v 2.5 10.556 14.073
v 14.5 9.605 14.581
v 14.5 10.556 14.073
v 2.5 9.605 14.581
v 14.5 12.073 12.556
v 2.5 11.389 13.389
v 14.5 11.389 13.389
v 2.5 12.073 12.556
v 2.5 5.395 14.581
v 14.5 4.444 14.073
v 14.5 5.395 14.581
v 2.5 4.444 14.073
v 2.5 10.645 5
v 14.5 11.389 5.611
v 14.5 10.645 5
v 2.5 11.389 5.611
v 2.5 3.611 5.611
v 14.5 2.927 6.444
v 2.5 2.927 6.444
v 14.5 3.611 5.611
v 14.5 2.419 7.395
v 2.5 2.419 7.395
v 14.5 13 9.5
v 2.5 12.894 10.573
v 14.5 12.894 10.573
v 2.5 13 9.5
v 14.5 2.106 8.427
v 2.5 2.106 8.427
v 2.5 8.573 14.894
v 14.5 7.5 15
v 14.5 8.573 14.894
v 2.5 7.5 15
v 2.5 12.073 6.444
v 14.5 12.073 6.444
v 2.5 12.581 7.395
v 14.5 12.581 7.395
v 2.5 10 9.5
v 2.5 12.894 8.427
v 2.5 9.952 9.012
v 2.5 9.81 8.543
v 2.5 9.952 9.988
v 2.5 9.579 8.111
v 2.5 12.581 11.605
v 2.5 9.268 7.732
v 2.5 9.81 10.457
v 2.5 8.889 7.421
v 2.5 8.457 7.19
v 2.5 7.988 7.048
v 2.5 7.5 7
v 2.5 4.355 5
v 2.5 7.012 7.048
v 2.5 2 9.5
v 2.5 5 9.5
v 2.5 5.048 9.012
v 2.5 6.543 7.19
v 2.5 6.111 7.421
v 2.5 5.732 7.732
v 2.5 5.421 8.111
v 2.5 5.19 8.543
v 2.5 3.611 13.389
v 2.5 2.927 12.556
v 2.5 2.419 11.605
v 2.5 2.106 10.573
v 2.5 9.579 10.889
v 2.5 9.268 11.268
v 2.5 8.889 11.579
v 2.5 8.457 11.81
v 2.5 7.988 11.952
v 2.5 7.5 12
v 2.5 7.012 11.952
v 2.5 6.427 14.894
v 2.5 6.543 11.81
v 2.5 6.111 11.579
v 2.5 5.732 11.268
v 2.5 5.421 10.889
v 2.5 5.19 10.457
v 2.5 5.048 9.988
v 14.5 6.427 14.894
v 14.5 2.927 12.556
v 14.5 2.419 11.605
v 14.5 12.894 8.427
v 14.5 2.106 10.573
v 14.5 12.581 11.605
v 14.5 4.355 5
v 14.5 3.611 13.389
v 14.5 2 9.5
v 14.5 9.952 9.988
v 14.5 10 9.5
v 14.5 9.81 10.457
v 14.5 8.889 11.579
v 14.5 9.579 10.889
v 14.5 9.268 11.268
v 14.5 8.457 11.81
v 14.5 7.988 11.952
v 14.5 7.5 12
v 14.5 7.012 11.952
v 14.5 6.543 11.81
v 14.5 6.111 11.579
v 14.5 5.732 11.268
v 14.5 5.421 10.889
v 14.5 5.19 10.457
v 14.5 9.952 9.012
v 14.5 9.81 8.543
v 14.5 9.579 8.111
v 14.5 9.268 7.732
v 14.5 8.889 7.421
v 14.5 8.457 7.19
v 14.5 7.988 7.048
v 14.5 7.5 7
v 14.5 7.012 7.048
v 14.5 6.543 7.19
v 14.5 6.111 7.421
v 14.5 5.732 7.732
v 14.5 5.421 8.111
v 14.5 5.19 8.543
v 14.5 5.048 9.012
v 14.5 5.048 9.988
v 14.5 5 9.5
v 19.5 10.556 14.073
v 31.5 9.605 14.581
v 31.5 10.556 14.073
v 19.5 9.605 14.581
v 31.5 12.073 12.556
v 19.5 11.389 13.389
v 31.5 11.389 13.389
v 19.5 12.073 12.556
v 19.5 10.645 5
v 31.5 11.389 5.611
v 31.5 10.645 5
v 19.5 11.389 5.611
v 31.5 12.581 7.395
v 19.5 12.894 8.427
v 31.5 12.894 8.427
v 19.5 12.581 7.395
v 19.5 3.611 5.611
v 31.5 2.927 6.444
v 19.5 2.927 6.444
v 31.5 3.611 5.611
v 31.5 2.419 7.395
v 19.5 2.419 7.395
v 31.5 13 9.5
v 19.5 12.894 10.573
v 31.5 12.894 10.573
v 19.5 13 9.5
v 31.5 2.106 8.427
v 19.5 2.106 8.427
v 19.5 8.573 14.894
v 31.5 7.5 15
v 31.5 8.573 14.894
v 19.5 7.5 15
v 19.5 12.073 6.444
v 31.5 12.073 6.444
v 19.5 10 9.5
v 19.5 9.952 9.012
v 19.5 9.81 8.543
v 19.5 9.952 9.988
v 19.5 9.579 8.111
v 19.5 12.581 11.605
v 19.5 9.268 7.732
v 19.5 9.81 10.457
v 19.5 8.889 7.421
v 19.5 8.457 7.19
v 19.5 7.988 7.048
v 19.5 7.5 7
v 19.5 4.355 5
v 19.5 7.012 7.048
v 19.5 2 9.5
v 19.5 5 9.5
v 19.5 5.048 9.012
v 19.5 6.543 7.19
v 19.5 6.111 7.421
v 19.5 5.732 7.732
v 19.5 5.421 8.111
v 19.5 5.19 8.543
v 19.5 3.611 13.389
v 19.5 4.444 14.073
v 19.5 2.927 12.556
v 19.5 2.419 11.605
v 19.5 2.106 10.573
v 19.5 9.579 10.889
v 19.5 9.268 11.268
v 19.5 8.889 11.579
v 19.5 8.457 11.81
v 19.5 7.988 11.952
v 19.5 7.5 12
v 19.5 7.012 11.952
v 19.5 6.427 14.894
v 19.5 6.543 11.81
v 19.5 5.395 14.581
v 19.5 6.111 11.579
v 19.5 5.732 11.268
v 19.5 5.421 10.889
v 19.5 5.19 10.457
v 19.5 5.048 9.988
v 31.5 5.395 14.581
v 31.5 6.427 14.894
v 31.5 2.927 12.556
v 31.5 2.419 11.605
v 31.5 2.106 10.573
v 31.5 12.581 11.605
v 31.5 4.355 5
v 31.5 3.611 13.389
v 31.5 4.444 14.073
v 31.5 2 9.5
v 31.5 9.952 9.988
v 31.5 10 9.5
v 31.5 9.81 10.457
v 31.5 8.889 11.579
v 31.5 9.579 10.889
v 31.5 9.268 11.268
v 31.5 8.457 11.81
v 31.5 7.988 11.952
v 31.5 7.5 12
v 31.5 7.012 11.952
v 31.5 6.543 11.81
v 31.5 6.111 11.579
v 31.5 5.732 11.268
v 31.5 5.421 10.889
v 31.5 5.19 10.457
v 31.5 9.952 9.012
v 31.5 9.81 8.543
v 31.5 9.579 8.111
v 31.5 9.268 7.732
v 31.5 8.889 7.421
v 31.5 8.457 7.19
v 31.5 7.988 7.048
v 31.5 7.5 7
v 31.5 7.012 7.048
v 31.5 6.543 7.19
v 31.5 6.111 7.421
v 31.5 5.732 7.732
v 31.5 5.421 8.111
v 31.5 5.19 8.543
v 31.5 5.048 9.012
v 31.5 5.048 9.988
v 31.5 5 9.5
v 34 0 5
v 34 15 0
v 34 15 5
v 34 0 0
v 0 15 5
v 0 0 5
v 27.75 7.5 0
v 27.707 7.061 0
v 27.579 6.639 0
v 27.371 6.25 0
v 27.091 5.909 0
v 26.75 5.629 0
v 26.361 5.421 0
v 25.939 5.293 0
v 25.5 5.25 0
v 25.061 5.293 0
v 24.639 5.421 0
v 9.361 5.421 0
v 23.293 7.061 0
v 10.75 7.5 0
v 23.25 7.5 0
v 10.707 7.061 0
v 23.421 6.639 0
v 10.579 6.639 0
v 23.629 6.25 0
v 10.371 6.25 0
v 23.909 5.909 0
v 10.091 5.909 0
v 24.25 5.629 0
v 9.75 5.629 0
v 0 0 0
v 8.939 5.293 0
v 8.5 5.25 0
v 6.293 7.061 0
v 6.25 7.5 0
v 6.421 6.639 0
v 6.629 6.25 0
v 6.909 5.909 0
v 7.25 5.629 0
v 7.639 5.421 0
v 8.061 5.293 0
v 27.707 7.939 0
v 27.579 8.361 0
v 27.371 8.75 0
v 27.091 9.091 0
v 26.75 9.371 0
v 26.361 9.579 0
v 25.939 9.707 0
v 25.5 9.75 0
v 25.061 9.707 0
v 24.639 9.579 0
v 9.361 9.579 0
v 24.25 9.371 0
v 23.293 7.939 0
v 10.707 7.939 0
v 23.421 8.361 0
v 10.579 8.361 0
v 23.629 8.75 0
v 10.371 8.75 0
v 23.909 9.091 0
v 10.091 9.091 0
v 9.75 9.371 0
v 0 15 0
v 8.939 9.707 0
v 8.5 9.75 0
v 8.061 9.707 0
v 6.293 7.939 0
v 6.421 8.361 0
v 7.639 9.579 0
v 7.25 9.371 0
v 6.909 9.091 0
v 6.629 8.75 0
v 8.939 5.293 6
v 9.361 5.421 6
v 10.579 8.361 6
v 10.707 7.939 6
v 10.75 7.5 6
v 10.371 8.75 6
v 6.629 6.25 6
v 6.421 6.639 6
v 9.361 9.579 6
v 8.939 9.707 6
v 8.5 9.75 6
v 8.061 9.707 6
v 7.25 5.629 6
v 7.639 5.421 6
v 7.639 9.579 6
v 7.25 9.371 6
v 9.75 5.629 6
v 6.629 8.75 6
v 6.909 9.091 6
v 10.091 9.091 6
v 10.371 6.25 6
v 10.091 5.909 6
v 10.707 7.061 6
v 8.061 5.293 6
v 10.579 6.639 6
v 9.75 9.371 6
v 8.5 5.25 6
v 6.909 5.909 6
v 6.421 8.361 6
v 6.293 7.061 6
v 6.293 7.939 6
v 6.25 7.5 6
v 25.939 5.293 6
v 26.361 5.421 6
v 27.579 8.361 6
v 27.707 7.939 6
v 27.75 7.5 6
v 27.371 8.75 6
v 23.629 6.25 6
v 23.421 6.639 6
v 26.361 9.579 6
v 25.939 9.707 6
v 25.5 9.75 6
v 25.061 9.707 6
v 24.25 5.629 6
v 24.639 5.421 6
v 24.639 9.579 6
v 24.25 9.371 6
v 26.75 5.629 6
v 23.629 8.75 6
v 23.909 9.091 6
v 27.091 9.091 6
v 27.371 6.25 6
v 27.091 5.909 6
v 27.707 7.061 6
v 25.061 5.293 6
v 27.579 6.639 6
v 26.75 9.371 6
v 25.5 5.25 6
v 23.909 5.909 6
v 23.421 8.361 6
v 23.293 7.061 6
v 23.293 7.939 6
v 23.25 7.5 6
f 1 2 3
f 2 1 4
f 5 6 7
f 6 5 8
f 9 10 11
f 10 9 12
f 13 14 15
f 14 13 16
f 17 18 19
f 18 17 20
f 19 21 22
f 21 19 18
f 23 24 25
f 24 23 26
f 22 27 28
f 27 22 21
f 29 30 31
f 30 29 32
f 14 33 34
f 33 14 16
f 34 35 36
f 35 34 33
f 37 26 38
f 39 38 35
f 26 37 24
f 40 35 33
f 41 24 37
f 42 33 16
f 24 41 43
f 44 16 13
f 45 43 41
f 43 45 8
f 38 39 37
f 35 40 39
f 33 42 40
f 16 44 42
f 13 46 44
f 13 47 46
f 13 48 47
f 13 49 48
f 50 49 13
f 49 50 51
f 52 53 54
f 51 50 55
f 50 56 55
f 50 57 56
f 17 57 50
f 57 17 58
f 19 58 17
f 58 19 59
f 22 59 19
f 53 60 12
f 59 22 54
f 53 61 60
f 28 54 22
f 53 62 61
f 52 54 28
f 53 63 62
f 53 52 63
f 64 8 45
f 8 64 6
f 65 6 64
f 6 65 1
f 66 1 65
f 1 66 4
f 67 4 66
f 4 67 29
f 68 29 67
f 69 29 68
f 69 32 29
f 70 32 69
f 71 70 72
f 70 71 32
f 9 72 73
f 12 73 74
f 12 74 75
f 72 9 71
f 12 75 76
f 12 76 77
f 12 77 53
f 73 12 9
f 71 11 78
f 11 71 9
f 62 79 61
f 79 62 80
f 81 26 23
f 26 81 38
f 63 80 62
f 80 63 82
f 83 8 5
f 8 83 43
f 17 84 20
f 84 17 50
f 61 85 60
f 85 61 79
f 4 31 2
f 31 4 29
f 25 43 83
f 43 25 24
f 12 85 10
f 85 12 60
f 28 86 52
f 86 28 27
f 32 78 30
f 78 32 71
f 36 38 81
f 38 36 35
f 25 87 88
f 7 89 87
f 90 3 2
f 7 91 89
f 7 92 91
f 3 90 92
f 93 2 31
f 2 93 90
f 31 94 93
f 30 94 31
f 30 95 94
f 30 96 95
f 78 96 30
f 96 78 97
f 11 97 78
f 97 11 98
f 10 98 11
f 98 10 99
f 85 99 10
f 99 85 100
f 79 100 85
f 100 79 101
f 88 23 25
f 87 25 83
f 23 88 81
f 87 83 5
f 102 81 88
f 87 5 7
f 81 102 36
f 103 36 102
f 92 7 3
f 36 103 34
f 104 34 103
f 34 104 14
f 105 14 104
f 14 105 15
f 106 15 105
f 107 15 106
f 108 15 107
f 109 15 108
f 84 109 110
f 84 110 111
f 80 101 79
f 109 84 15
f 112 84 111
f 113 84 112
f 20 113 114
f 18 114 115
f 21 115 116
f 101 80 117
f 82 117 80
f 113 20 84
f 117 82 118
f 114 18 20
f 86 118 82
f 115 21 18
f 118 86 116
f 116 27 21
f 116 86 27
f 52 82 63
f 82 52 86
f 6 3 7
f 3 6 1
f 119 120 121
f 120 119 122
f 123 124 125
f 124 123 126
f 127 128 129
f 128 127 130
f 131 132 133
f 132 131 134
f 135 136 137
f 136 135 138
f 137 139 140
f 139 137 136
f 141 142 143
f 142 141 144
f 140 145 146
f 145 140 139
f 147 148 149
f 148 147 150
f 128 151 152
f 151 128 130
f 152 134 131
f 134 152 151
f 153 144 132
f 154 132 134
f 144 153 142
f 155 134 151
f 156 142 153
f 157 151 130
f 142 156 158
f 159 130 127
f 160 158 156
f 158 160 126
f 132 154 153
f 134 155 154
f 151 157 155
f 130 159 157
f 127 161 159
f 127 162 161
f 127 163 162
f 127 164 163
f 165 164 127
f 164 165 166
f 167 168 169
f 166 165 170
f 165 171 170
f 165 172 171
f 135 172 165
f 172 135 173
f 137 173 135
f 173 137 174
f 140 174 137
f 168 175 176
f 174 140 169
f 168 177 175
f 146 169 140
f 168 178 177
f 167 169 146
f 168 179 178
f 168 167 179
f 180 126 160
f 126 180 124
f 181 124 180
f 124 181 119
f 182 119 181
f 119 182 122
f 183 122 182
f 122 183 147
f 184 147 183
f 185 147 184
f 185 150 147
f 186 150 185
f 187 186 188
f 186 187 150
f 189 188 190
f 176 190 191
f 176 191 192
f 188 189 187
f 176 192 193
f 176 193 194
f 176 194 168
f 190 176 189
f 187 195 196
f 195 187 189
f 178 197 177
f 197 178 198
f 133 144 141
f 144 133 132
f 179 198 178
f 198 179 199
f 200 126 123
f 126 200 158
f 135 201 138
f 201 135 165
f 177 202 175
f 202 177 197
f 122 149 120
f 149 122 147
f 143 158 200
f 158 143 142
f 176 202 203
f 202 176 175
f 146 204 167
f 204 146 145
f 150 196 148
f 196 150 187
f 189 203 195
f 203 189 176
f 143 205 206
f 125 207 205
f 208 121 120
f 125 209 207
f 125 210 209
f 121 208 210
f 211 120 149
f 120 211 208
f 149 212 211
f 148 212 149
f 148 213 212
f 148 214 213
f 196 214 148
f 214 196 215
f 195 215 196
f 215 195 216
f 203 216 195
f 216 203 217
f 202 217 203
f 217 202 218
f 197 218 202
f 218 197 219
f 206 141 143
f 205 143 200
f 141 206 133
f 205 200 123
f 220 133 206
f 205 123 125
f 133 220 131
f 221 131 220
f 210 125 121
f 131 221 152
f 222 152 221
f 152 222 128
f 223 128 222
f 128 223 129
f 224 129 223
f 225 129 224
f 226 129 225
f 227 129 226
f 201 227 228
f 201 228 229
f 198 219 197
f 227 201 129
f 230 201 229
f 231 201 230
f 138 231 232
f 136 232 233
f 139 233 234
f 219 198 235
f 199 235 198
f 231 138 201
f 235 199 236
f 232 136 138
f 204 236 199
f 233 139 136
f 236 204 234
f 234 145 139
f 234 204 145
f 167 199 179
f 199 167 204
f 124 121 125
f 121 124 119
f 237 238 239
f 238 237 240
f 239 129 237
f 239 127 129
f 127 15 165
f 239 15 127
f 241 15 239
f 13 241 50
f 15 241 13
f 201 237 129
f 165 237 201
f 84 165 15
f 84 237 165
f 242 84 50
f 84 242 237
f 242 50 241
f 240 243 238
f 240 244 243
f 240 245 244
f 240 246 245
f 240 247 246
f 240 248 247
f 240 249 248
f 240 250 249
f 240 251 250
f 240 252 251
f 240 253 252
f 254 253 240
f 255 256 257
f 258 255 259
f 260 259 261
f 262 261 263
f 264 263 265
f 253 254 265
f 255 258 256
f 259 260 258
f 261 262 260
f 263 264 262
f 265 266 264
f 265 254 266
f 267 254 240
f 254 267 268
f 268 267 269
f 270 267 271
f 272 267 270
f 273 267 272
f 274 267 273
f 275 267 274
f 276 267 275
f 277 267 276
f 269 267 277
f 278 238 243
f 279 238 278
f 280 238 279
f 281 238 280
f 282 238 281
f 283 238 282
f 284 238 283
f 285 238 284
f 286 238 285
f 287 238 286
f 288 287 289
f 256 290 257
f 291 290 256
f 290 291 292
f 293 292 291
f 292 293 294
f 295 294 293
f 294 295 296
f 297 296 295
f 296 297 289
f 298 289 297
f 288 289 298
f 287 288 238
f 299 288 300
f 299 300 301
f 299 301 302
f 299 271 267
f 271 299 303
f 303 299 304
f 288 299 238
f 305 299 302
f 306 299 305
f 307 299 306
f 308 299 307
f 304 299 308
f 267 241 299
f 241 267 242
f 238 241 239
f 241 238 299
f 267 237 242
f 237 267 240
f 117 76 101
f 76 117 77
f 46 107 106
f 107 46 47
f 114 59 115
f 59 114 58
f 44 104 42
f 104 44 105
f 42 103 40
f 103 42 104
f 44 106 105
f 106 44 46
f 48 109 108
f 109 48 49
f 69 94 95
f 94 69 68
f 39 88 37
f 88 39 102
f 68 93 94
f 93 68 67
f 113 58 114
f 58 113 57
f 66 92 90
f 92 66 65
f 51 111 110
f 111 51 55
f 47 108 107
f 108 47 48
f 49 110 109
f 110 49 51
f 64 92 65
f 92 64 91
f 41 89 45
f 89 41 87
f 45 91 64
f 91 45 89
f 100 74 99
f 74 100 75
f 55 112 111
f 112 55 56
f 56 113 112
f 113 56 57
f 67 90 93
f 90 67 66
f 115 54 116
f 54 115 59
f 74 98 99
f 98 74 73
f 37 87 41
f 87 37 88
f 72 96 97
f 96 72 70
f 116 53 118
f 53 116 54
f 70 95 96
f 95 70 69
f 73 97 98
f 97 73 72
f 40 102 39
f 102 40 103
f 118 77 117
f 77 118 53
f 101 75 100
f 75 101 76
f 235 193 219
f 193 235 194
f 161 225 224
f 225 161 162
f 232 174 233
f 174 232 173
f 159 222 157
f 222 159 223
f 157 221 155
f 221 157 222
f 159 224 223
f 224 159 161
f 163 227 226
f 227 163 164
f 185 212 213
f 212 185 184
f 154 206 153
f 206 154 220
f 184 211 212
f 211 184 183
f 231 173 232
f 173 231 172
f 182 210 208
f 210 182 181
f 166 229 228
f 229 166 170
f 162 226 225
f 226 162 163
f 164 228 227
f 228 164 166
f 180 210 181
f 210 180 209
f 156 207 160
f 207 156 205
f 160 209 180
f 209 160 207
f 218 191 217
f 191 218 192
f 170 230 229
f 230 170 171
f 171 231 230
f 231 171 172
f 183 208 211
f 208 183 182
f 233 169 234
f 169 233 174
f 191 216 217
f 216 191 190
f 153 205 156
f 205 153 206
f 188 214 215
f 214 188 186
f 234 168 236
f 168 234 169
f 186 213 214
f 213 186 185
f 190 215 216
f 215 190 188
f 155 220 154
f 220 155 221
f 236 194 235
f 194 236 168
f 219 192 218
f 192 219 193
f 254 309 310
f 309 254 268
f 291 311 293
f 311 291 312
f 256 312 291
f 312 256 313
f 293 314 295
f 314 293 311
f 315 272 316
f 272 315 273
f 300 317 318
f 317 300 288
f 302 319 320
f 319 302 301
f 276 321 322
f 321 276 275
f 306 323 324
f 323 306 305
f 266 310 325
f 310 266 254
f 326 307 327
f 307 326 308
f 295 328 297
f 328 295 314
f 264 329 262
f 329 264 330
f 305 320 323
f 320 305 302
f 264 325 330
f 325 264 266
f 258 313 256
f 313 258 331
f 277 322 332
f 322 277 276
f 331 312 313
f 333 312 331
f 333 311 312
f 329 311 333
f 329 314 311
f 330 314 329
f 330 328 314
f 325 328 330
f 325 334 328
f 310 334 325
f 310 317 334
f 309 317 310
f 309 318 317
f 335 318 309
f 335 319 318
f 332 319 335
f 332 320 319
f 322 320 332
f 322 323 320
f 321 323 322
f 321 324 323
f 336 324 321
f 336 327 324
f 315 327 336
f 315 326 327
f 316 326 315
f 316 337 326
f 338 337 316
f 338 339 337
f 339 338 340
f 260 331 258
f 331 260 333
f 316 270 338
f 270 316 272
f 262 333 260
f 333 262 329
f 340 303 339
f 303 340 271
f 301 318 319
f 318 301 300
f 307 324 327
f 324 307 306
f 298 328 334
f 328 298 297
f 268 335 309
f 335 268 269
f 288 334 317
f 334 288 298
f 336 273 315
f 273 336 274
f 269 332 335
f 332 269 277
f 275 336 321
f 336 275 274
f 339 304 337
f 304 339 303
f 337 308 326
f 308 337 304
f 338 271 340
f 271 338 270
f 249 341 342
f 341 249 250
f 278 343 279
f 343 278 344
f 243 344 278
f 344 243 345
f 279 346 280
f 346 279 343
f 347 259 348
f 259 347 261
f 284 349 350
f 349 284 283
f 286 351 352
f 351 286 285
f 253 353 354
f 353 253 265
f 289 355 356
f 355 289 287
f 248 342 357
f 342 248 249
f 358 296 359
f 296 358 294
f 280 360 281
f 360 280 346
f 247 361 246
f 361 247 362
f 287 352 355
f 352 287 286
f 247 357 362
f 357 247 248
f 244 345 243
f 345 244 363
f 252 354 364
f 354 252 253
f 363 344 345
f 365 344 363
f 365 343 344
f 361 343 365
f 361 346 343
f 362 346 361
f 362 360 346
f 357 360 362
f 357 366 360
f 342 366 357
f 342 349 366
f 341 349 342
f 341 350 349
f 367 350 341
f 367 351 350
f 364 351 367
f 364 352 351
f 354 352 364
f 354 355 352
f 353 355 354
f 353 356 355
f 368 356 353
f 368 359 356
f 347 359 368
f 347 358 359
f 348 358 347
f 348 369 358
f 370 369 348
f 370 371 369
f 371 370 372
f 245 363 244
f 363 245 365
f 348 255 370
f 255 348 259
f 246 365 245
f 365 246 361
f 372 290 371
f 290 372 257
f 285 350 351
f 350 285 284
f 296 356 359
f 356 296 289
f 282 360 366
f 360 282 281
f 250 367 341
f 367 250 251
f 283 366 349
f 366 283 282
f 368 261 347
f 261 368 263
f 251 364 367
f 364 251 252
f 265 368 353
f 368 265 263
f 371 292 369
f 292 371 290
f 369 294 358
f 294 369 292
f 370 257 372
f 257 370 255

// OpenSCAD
$fn = 32;

// ----------------------------------------------------------------------
// Cable clip: cable 5 mm, clamp 11 mm, base 34 mm
// ----------------------------------------------------------------------

// --- parameters (mm) ---
foot_w = 34;              // base length, X
foot_d = 15;              // base width, Y
foot_t = 5;               // base thickness
hose_seat_d = 11;         // clamp outside diameter
ring_t = 3;               // clamp wall
cable_d = 5;              // cable opening
ring_w = 12;              // clamp width along the cable
screw_d = 4.5;            // screw clearance
sink = 1;                 // overlap of the clamp into the base
pitch = 17;               // distance between the two clamps

module base() {
  cube([foot_w, foot_d, foot_t]);
}

module clamps() {
  for (sx = [-1, 1])
    translate([foot_w / 2 + sx * pitch / 2, foot_d / 2, foot_t + hose_seat_d / 2 - sink]) rotate([0, 90, 0])
      cylinder(h = ring_w, d = hose_seat_d, center = true);
}

difference() {
  union() {
    base();
    clamps();
  }
  for (sx = [-1, 1])
    translate([foot_w / 2 + sx * pitch / 2, foot_d / 2, foot_t + hose_seat_d / 2 - sink]) rotate([0, 90, 0]) translate([0, 0, -ring_w / 2 - 1]) cylinder(h = ring_w + 2, d = cable_d);
  translate([8.5, foot_d / 2, -1]) cylinder(h = foot_t + 2, d = screw_d);
  translate([25.5, foot_d / 2, -1]) cylinder(h = foot_t + 2, d = screw_d);
}
